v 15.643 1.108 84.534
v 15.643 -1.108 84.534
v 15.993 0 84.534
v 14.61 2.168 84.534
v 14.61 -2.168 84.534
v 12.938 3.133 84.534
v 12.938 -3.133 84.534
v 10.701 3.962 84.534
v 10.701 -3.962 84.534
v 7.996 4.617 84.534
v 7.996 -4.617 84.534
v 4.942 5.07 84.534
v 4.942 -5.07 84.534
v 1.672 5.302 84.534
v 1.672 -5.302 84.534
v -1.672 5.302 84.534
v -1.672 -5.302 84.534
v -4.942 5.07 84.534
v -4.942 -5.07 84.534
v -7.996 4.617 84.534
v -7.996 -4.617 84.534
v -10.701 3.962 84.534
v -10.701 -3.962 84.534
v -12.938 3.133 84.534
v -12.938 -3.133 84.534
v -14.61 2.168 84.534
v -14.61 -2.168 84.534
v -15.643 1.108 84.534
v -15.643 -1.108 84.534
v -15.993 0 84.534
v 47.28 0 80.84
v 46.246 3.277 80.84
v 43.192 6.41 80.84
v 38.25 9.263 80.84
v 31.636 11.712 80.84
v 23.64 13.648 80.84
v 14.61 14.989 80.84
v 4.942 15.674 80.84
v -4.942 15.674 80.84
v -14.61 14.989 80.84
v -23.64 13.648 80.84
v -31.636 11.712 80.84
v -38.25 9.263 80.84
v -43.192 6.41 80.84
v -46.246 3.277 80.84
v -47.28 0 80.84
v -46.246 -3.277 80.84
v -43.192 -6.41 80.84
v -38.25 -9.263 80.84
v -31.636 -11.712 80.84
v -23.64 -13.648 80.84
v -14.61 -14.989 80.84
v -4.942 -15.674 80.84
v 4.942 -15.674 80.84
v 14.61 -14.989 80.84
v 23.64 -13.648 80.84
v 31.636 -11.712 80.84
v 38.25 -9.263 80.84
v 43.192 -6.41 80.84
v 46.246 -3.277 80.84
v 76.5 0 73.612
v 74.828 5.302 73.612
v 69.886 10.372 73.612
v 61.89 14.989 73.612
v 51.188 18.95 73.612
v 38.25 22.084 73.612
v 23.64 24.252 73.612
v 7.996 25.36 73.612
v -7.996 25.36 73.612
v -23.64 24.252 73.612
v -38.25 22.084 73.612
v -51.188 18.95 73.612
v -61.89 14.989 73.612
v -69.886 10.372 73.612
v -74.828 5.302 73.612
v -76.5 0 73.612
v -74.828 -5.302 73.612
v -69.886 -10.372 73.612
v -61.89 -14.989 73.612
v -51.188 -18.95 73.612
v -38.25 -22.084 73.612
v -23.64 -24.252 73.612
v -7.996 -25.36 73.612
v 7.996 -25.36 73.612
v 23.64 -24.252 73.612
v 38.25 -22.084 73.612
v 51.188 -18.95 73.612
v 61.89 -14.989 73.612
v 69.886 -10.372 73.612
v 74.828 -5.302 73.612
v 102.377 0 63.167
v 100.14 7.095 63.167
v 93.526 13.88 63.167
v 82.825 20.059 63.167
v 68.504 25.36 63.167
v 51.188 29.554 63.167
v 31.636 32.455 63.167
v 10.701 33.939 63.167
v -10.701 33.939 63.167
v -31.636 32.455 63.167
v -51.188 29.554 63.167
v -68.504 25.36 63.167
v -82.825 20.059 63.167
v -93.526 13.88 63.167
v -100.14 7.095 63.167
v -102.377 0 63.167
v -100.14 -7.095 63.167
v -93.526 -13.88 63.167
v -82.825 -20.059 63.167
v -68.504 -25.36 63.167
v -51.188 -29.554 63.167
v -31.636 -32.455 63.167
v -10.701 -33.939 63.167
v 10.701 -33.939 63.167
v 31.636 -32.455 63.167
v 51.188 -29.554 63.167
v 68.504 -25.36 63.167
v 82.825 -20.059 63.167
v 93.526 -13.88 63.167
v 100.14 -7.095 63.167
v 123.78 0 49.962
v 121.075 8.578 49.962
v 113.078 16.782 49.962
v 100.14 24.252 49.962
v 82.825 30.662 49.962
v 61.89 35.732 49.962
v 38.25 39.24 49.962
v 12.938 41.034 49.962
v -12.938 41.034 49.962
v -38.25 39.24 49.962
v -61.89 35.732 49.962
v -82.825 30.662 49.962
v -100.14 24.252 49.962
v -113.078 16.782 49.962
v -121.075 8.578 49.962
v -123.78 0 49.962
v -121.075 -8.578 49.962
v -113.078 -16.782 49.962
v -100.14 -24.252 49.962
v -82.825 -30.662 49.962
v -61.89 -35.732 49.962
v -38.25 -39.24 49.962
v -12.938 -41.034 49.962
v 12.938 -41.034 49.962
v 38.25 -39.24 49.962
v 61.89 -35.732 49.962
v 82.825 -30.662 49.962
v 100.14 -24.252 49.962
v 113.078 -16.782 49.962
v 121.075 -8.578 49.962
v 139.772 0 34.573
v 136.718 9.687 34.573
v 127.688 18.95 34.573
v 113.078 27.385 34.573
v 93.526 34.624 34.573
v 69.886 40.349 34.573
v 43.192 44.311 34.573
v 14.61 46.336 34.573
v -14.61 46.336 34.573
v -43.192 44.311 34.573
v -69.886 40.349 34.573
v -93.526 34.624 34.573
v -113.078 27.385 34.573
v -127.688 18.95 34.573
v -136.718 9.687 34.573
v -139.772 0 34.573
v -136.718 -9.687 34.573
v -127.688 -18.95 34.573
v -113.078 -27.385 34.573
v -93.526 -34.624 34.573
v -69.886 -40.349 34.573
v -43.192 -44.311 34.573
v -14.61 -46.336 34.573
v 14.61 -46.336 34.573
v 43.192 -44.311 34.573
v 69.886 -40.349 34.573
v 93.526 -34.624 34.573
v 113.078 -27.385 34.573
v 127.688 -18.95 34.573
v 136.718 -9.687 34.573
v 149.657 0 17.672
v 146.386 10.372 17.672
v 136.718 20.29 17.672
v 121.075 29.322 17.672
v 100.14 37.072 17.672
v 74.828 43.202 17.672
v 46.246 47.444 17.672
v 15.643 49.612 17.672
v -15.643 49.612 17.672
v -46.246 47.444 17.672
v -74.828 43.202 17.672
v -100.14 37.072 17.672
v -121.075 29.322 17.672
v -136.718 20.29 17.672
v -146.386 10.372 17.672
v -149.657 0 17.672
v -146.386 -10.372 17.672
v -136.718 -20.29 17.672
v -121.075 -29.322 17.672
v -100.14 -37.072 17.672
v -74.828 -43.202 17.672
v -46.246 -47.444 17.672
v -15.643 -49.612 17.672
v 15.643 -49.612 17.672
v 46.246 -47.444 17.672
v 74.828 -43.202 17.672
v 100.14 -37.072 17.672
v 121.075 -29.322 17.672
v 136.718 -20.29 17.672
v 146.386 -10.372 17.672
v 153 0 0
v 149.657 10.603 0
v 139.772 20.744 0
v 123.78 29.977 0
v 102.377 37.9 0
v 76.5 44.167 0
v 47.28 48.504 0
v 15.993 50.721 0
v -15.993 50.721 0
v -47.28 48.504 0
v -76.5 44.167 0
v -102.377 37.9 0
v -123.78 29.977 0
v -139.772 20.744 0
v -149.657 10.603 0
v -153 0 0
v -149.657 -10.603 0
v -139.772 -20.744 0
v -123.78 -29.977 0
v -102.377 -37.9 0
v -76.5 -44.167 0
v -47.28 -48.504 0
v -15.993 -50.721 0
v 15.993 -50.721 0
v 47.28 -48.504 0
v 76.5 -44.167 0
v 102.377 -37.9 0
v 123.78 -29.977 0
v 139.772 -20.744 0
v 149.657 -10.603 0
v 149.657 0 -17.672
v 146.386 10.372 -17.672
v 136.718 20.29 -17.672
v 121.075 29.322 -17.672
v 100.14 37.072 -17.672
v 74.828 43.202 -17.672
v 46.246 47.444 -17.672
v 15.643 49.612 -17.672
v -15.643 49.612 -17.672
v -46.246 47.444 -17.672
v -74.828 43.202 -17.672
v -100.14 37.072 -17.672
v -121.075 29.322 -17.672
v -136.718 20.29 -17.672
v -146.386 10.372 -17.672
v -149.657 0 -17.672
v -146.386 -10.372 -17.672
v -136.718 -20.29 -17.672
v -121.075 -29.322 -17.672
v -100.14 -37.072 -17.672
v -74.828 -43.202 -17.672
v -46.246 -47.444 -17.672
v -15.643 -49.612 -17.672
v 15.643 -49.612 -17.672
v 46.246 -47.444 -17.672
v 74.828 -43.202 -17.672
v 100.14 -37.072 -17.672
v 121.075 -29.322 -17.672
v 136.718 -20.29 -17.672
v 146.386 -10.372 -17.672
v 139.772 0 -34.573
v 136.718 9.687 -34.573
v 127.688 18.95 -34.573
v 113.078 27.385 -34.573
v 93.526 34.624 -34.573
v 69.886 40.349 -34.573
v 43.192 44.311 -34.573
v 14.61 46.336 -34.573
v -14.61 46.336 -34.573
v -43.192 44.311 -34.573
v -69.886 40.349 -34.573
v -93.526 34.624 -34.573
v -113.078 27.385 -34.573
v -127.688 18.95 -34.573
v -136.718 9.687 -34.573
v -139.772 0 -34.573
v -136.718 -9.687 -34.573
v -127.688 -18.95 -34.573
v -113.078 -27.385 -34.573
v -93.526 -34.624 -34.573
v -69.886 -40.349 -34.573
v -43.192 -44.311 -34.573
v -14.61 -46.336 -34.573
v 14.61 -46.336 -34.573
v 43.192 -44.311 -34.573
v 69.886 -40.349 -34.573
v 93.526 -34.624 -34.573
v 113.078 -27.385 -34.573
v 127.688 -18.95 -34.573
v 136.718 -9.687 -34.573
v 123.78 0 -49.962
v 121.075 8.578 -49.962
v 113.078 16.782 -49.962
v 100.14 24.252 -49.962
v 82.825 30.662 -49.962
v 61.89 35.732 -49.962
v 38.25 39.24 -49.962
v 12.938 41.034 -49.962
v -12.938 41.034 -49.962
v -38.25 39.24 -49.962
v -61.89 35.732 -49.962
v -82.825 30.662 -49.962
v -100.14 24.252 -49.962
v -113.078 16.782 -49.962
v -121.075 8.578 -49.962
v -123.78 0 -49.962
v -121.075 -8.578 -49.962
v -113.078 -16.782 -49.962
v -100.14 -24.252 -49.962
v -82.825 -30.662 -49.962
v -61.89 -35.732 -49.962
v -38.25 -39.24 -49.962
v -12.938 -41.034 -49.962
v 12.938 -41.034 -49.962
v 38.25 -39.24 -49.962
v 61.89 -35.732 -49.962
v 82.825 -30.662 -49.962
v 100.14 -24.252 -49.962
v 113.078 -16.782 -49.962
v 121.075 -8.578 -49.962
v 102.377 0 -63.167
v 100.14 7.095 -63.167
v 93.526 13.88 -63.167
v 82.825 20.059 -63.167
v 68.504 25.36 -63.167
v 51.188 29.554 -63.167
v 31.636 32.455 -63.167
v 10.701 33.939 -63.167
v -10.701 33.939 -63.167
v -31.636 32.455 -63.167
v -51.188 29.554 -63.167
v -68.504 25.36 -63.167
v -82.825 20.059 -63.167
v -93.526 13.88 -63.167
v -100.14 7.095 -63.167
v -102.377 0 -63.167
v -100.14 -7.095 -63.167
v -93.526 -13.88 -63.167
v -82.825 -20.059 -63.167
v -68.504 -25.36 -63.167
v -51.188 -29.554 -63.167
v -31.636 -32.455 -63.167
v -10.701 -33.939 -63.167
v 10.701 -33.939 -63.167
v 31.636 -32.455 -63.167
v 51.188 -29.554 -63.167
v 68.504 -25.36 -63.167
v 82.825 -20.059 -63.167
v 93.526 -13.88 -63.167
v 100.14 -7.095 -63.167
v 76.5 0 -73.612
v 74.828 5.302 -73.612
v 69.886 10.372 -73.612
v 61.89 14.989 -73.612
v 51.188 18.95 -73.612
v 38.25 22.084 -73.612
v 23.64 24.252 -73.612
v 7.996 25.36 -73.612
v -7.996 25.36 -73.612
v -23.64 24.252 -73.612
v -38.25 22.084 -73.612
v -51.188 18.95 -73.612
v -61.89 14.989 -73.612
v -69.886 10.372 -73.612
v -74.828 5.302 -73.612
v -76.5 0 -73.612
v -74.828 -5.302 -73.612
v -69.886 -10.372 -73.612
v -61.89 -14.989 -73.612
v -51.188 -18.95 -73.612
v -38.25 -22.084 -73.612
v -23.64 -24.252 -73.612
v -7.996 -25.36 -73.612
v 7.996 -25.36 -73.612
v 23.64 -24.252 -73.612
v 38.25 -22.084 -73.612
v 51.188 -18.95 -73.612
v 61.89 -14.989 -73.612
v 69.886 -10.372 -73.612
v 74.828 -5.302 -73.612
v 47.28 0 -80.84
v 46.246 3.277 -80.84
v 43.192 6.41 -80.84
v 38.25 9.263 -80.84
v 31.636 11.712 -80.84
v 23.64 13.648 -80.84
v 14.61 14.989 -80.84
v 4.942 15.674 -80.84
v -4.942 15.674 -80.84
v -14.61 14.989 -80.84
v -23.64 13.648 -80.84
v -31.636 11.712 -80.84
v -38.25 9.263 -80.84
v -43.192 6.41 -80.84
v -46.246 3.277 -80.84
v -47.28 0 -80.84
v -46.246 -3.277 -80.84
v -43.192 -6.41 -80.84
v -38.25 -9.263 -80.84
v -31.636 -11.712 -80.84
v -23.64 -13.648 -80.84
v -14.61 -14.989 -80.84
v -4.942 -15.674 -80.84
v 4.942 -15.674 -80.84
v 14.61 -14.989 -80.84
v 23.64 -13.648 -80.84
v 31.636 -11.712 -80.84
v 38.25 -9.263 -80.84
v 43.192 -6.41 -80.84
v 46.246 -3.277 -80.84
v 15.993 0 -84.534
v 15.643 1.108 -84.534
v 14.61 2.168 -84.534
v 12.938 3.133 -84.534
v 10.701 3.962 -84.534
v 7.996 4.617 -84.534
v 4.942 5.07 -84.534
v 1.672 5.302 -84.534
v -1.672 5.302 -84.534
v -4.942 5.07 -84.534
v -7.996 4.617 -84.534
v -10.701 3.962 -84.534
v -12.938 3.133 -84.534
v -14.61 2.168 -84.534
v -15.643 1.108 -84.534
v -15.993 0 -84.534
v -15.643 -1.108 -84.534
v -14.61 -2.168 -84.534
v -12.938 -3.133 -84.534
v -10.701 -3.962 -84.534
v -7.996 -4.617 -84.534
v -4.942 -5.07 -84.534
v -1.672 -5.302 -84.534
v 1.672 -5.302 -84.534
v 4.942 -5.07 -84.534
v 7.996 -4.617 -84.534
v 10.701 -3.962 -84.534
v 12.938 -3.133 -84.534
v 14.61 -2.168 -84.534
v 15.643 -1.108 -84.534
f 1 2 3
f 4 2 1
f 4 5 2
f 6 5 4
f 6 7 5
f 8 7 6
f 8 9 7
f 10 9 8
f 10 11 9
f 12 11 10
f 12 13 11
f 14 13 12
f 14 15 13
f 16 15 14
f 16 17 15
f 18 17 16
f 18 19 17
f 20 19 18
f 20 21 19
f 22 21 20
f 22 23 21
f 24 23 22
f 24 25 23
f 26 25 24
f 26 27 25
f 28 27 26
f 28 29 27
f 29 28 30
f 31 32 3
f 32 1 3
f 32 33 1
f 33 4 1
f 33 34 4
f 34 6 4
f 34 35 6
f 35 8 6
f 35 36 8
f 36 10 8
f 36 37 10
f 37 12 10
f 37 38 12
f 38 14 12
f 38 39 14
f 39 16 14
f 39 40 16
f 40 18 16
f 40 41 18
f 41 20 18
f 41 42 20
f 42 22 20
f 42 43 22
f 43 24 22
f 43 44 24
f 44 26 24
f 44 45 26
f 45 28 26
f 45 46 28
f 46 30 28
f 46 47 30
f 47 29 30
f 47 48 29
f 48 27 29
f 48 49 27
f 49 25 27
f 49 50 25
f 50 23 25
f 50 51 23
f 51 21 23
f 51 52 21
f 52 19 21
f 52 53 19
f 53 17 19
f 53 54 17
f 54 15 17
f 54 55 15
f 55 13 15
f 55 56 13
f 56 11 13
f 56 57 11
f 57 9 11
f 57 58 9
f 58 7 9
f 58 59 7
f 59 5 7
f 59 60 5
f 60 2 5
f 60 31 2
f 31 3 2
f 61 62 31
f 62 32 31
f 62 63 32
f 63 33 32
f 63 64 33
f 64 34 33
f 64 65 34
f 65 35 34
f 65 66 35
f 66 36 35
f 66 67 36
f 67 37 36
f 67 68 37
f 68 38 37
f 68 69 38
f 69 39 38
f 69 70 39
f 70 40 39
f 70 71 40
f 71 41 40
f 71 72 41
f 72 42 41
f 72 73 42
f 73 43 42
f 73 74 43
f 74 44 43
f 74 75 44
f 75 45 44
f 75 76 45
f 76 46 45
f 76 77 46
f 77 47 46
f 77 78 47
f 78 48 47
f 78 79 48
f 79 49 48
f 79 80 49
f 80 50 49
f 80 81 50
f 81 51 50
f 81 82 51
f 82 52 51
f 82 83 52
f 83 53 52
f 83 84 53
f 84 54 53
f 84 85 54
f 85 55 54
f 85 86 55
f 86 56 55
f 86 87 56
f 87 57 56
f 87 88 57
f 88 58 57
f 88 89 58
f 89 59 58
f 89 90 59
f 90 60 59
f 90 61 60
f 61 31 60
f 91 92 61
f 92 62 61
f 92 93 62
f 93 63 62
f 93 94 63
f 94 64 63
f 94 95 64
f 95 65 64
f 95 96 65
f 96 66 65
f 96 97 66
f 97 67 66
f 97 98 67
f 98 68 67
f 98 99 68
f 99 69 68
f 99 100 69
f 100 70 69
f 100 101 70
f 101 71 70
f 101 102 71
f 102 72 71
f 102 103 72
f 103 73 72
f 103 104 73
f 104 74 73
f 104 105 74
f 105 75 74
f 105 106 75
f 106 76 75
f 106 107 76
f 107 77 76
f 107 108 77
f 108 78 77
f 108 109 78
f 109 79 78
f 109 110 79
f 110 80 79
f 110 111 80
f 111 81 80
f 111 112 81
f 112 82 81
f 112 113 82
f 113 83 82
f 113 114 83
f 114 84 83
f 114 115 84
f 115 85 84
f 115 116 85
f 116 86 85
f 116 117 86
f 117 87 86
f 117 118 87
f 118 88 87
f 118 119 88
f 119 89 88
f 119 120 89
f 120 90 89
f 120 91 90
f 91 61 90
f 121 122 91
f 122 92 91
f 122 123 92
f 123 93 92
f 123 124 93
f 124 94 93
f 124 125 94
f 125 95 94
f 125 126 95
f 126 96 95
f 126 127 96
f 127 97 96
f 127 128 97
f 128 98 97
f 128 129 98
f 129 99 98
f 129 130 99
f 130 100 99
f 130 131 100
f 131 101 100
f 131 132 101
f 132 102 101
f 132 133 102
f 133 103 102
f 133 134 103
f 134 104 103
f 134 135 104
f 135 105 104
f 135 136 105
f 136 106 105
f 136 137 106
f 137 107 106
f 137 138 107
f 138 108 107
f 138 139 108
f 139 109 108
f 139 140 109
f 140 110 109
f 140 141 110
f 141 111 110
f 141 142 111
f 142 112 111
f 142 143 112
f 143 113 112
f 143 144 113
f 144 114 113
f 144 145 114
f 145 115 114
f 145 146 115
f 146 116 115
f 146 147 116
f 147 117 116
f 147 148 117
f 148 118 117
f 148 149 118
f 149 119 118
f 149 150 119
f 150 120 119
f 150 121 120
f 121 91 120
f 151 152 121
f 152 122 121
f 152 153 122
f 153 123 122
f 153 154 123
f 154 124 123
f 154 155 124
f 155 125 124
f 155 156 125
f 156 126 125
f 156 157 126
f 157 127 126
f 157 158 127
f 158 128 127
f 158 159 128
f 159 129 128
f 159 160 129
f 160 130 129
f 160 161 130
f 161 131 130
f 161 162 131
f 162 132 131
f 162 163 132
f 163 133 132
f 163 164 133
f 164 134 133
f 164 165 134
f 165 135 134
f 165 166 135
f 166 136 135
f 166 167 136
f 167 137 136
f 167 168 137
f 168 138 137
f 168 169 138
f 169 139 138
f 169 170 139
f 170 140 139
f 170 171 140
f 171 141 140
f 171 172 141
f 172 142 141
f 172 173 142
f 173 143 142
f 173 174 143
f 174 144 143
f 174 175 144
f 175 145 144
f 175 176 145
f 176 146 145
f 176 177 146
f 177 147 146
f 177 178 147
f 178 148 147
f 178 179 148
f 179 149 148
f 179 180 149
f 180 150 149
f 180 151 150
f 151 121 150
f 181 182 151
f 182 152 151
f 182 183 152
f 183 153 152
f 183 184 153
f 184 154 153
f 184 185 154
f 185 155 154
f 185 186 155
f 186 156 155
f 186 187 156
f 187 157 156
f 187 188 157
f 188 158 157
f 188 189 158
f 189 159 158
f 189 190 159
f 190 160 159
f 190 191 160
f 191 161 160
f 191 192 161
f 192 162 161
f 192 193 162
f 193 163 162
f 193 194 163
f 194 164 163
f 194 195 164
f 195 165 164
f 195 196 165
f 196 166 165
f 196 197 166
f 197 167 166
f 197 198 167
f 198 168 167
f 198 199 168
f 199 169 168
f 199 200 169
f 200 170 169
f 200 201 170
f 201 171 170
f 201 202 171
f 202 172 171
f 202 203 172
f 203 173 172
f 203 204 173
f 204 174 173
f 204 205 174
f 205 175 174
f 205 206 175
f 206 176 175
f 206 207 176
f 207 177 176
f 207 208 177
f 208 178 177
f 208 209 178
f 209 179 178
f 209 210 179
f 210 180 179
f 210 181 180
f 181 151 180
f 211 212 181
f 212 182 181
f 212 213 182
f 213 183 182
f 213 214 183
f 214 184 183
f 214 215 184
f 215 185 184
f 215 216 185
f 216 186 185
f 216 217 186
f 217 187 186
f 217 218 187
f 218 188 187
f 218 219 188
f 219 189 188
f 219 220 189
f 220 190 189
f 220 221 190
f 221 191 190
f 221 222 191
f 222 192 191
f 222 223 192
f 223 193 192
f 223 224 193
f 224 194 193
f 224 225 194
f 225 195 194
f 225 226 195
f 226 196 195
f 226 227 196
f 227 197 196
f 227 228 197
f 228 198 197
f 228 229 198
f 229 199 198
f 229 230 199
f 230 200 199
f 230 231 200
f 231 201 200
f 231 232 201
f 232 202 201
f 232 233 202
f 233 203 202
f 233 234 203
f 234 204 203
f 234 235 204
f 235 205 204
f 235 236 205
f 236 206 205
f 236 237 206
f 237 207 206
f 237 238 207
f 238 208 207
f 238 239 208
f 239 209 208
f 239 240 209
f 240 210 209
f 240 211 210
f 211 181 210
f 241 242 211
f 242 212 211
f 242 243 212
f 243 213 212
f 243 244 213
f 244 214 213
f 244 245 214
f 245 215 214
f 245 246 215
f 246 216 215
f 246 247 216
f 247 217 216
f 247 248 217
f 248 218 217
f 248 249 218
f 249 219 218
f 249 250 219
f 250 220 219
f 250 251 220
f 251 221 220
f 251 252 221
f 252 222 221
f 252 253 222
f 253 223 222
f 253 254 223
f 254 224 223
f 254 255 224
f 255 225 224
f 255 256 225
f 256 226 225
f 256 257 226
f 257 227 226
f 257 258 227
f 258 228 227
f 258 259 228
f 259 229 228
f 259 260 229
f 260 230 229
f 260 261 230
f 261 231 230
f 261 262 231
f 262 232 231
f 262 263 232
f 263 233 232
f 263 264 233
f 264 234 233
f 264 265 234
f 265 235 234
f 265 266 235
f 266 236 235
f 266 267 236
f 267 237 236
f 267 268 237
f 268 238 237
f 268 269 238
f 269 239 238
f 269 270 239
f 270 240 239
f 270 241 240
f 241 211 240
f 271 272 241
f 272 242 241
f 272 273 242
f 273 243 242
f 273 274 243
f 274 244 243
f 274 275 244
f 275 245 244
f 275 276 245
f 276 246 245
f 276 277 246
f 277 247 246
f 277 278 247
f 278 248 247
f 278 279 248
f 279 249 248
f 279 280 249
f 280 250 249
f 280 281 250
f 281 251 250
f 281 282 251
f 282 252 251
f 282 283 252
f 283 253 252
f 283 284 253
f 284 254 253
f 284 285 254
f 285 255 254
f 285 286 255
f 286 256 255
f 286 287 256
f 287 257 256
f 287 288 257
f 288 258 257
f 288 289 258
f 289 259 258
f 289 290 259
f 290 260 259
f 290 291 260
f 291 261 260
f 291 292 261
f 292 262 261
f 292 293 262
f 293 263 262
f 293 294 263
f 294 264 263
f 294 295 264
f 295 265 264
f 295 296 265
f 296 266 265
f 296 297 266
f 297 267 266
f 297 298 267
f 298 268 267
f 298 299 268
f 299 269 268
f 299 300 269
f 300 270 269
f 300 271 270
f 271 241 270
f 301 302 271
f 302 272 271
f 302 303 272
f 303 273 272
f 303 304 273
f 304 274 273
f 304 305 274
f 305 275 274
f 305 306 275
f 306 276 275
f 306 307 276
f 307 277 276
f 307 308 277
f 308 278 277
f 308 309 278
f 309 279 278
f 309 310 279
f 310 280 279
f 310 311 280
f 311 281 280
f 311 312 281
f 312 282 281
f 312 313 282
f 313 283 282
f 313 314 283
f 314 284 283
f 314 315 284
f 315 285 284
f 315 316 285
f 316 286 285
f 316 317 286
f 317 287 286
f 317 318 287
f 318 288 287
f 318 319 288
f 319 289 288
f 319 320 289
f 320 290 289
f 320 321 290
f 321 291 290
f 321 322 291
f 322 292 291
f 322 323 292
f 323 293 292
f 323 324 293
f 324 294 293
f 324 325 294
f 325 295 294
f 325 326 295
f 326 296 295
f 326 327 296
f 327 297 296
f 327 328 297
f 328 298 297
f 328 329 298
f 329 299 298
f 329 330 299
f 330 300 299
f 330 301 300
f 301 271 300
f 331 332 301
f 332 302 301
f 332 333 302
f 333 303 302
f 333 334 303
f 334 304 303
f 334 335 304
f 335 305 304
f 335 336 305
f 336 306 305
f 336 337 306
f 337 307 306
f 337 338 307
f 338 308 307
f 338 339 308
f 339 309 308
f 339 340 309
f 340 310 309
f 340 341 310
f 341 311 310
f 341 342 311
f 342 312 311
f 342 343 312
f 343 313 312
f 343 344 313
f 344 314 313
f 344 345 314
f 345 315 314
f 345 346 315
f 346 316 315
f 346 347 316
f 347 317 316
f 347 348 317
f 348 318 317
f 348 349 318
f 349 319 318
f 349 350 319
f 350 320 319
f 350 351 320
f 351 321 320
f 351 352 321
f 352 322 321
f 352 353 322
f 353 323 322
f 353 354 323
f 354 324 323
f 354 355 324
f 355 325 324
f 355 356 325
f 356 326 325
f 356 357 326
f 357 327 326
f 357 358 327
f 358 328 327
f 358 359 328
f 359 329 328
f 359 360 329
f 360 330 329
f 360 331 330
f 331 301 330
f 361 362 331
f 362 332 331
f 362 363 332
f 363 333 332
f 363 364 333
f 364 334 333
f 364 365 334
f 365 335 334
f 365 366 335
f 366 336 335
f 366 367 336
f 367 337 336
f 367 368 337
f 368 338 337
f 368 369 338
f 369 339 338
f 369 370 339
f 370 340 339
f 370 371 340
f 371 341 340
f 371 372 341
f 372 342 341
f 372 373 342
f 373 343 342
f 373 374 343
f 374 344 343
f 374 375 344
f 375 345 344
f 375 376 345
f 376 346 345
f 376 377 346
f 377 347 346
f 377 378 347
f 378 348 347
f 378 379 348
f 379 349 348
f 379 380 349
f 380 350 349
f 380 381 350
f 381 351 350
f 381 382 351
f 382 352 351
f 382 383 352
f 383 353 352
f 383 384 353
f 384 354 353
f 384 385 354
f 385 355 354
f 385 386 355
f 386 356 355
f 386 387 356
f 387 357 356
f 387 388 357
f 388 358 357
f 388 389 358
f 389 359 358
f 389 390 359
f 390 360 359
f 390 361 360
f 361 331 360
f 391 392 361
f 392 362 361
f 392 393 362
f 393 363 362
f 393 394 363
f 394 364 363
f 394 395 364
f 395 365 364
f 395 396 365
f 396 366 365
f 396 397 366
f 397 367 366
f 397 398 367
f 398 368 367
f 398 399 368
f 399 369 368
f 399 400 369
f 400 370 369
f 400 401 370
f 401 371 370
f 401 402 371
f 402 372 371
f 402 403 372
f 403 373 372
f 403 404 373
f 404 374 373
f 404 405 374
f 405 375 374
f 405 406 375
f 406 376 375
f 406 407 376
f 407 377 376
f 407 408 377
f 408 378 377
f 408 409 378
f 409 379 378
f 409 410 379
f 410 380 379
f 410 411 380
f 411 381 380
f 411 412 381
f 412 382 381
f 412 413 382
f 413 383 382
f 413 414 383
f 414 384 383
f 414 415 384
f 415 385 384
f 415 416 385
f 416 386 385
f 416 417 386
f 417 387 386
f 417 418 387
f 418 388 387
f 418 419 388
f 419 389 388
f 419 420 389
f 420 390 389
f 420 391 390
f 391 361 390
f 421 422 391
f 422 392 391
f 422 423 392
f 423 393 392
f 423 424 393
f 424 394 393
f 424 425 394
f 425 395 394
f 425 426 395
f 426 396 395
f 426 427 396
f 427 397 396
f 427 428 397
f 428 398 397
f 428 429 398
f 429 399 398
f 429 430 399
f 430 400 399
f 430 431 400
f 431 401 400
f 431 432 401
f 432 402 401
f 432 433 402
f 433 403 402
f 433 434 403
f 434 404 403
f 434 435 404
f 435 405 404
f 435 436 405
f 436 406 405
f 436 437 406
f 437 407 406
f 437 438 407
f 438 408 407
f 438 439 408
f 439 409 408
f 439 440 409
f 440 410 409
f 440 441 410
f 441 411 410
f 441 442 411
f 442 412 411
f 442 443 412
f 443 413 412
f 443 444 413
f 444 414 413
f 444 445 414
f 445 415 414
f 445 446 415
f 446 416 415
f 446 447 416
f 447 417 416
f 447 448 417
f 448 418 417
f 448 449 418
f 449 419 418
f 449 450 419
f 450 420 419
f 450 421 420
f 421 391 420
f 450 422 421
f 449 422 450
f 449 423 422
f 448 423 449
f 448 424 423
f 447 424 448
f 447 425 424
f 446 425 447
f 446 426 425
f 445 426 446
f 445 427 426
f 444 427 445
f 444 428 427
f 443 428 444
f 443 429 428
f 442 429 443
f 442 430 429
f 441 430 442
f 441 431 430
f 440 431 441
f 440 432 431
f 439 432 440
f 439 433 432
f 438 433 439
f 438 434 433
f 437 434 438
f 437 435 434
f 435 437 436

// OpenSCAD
// Generated by SolidPython 1.0.1 on 2020-07-29 00:46:48


scale(v = [9, 3, 5]) {
	sphere(r = 17);
}
/***********************************************
*********      SolidPython code:      **********
************************************************
 
# import packages: SolidPython
from solid import *
from solid.utils import *
from itertools import chain, combinations, permutations


class Resize:

    def __init__(self, scad_file):
        self.scad_file = scad_file
        #self.scad_file = import_scad(scad_file)
        # cone/cylinder param:
        self.r1 = 0
        self.r2 = 0
        self.h = 0
        # rectangular prism param:
        self.w = 0
        self.l = 0
        # ellipse param:
        self.r = 0

    # import OpenScad code (file name corresponds to shape)


    # classify shape + parameters
    def assign(self, param1, param2, param3):
        if self.scad_file == 'cone.scad':
            self.r1 = param1
            self.r2 = param2
            self.h = param3
        elif self.scad_file == 'cylinder.scad':
            self.r1 = param1
            self.r2 = param2
            self.h = param3
        elif self.scad_file == 'rectangularPrism.scad':
            self.h = param1
            self.l = param2
            self.w = param3
        else:
            self.r = param1
            self.h = param2

    # resize parameters
    def iterate(self):
        x = range(3, 20, 2)
        i = 1
        if self.scad_file == 'cone.scad':
            tempList = list(permutations(x, 2))
            for temp in tempList:
                param1 = temp[0]
                param2 = temp[1]
                filepath = 'produced_scad_files/' + 'cone' + str(param1) + '_' + str(param2) + '_' + '.scad'
                scad_render_to_file(cylinder(h=param1, r1=param2, r2=0), filepath)

        elif self.scad_file == 'cylinder.scad':
            tempList = list(permutations(x, 3))
            for temp in tempList:
                param1 = temp[0]
                param2 = temp[1]
                filepath = 'produced_scad_files/' + 'cylinder' + str(param1) + '_' + str(param2) + '_' + '.scad'
                scad_render_to_file(cylinder(h=param1, r1=param2, r2=param2), filepath)

        elif self.scad_file == 'rectangularPrism.scad':
            tempList = list(permutations(x, 3))
            for temp in tempList:
                param1 = temp[0]
                param2 = temp[1]
                param3 = temp[2]
                filepath = 'produced_scad_files/' + 'rectangularPrism' + str(param1) + '_' + str(param2) + '_' + str(
                    param3) + '.scad'
                scad_render_to_file(cube(size=(param1, param2, param3)), filepath)

        elif self.scad_file == 'ellipse.scad':
            tempList = list(permutations(x, 4))
            for temp in tempList:
                param1 = temp[0]
                param2 = temp[1]
                param3 = temp[2]
                param4 = temp[3]
                filepath = 'produced_scad_files/' + 'ellipse' + str(param1) + '_' + str(param2) + '_' + str(param3) + '_' + str(param4) + '.scad'
                scad_render_to_file(scale([param1, param2, param3])(sphere(r=param4)), filepath)

    def render_to_scadfile(self):
        scad_render_to_file(scad, 'example.scad') 
 
************************************************/
